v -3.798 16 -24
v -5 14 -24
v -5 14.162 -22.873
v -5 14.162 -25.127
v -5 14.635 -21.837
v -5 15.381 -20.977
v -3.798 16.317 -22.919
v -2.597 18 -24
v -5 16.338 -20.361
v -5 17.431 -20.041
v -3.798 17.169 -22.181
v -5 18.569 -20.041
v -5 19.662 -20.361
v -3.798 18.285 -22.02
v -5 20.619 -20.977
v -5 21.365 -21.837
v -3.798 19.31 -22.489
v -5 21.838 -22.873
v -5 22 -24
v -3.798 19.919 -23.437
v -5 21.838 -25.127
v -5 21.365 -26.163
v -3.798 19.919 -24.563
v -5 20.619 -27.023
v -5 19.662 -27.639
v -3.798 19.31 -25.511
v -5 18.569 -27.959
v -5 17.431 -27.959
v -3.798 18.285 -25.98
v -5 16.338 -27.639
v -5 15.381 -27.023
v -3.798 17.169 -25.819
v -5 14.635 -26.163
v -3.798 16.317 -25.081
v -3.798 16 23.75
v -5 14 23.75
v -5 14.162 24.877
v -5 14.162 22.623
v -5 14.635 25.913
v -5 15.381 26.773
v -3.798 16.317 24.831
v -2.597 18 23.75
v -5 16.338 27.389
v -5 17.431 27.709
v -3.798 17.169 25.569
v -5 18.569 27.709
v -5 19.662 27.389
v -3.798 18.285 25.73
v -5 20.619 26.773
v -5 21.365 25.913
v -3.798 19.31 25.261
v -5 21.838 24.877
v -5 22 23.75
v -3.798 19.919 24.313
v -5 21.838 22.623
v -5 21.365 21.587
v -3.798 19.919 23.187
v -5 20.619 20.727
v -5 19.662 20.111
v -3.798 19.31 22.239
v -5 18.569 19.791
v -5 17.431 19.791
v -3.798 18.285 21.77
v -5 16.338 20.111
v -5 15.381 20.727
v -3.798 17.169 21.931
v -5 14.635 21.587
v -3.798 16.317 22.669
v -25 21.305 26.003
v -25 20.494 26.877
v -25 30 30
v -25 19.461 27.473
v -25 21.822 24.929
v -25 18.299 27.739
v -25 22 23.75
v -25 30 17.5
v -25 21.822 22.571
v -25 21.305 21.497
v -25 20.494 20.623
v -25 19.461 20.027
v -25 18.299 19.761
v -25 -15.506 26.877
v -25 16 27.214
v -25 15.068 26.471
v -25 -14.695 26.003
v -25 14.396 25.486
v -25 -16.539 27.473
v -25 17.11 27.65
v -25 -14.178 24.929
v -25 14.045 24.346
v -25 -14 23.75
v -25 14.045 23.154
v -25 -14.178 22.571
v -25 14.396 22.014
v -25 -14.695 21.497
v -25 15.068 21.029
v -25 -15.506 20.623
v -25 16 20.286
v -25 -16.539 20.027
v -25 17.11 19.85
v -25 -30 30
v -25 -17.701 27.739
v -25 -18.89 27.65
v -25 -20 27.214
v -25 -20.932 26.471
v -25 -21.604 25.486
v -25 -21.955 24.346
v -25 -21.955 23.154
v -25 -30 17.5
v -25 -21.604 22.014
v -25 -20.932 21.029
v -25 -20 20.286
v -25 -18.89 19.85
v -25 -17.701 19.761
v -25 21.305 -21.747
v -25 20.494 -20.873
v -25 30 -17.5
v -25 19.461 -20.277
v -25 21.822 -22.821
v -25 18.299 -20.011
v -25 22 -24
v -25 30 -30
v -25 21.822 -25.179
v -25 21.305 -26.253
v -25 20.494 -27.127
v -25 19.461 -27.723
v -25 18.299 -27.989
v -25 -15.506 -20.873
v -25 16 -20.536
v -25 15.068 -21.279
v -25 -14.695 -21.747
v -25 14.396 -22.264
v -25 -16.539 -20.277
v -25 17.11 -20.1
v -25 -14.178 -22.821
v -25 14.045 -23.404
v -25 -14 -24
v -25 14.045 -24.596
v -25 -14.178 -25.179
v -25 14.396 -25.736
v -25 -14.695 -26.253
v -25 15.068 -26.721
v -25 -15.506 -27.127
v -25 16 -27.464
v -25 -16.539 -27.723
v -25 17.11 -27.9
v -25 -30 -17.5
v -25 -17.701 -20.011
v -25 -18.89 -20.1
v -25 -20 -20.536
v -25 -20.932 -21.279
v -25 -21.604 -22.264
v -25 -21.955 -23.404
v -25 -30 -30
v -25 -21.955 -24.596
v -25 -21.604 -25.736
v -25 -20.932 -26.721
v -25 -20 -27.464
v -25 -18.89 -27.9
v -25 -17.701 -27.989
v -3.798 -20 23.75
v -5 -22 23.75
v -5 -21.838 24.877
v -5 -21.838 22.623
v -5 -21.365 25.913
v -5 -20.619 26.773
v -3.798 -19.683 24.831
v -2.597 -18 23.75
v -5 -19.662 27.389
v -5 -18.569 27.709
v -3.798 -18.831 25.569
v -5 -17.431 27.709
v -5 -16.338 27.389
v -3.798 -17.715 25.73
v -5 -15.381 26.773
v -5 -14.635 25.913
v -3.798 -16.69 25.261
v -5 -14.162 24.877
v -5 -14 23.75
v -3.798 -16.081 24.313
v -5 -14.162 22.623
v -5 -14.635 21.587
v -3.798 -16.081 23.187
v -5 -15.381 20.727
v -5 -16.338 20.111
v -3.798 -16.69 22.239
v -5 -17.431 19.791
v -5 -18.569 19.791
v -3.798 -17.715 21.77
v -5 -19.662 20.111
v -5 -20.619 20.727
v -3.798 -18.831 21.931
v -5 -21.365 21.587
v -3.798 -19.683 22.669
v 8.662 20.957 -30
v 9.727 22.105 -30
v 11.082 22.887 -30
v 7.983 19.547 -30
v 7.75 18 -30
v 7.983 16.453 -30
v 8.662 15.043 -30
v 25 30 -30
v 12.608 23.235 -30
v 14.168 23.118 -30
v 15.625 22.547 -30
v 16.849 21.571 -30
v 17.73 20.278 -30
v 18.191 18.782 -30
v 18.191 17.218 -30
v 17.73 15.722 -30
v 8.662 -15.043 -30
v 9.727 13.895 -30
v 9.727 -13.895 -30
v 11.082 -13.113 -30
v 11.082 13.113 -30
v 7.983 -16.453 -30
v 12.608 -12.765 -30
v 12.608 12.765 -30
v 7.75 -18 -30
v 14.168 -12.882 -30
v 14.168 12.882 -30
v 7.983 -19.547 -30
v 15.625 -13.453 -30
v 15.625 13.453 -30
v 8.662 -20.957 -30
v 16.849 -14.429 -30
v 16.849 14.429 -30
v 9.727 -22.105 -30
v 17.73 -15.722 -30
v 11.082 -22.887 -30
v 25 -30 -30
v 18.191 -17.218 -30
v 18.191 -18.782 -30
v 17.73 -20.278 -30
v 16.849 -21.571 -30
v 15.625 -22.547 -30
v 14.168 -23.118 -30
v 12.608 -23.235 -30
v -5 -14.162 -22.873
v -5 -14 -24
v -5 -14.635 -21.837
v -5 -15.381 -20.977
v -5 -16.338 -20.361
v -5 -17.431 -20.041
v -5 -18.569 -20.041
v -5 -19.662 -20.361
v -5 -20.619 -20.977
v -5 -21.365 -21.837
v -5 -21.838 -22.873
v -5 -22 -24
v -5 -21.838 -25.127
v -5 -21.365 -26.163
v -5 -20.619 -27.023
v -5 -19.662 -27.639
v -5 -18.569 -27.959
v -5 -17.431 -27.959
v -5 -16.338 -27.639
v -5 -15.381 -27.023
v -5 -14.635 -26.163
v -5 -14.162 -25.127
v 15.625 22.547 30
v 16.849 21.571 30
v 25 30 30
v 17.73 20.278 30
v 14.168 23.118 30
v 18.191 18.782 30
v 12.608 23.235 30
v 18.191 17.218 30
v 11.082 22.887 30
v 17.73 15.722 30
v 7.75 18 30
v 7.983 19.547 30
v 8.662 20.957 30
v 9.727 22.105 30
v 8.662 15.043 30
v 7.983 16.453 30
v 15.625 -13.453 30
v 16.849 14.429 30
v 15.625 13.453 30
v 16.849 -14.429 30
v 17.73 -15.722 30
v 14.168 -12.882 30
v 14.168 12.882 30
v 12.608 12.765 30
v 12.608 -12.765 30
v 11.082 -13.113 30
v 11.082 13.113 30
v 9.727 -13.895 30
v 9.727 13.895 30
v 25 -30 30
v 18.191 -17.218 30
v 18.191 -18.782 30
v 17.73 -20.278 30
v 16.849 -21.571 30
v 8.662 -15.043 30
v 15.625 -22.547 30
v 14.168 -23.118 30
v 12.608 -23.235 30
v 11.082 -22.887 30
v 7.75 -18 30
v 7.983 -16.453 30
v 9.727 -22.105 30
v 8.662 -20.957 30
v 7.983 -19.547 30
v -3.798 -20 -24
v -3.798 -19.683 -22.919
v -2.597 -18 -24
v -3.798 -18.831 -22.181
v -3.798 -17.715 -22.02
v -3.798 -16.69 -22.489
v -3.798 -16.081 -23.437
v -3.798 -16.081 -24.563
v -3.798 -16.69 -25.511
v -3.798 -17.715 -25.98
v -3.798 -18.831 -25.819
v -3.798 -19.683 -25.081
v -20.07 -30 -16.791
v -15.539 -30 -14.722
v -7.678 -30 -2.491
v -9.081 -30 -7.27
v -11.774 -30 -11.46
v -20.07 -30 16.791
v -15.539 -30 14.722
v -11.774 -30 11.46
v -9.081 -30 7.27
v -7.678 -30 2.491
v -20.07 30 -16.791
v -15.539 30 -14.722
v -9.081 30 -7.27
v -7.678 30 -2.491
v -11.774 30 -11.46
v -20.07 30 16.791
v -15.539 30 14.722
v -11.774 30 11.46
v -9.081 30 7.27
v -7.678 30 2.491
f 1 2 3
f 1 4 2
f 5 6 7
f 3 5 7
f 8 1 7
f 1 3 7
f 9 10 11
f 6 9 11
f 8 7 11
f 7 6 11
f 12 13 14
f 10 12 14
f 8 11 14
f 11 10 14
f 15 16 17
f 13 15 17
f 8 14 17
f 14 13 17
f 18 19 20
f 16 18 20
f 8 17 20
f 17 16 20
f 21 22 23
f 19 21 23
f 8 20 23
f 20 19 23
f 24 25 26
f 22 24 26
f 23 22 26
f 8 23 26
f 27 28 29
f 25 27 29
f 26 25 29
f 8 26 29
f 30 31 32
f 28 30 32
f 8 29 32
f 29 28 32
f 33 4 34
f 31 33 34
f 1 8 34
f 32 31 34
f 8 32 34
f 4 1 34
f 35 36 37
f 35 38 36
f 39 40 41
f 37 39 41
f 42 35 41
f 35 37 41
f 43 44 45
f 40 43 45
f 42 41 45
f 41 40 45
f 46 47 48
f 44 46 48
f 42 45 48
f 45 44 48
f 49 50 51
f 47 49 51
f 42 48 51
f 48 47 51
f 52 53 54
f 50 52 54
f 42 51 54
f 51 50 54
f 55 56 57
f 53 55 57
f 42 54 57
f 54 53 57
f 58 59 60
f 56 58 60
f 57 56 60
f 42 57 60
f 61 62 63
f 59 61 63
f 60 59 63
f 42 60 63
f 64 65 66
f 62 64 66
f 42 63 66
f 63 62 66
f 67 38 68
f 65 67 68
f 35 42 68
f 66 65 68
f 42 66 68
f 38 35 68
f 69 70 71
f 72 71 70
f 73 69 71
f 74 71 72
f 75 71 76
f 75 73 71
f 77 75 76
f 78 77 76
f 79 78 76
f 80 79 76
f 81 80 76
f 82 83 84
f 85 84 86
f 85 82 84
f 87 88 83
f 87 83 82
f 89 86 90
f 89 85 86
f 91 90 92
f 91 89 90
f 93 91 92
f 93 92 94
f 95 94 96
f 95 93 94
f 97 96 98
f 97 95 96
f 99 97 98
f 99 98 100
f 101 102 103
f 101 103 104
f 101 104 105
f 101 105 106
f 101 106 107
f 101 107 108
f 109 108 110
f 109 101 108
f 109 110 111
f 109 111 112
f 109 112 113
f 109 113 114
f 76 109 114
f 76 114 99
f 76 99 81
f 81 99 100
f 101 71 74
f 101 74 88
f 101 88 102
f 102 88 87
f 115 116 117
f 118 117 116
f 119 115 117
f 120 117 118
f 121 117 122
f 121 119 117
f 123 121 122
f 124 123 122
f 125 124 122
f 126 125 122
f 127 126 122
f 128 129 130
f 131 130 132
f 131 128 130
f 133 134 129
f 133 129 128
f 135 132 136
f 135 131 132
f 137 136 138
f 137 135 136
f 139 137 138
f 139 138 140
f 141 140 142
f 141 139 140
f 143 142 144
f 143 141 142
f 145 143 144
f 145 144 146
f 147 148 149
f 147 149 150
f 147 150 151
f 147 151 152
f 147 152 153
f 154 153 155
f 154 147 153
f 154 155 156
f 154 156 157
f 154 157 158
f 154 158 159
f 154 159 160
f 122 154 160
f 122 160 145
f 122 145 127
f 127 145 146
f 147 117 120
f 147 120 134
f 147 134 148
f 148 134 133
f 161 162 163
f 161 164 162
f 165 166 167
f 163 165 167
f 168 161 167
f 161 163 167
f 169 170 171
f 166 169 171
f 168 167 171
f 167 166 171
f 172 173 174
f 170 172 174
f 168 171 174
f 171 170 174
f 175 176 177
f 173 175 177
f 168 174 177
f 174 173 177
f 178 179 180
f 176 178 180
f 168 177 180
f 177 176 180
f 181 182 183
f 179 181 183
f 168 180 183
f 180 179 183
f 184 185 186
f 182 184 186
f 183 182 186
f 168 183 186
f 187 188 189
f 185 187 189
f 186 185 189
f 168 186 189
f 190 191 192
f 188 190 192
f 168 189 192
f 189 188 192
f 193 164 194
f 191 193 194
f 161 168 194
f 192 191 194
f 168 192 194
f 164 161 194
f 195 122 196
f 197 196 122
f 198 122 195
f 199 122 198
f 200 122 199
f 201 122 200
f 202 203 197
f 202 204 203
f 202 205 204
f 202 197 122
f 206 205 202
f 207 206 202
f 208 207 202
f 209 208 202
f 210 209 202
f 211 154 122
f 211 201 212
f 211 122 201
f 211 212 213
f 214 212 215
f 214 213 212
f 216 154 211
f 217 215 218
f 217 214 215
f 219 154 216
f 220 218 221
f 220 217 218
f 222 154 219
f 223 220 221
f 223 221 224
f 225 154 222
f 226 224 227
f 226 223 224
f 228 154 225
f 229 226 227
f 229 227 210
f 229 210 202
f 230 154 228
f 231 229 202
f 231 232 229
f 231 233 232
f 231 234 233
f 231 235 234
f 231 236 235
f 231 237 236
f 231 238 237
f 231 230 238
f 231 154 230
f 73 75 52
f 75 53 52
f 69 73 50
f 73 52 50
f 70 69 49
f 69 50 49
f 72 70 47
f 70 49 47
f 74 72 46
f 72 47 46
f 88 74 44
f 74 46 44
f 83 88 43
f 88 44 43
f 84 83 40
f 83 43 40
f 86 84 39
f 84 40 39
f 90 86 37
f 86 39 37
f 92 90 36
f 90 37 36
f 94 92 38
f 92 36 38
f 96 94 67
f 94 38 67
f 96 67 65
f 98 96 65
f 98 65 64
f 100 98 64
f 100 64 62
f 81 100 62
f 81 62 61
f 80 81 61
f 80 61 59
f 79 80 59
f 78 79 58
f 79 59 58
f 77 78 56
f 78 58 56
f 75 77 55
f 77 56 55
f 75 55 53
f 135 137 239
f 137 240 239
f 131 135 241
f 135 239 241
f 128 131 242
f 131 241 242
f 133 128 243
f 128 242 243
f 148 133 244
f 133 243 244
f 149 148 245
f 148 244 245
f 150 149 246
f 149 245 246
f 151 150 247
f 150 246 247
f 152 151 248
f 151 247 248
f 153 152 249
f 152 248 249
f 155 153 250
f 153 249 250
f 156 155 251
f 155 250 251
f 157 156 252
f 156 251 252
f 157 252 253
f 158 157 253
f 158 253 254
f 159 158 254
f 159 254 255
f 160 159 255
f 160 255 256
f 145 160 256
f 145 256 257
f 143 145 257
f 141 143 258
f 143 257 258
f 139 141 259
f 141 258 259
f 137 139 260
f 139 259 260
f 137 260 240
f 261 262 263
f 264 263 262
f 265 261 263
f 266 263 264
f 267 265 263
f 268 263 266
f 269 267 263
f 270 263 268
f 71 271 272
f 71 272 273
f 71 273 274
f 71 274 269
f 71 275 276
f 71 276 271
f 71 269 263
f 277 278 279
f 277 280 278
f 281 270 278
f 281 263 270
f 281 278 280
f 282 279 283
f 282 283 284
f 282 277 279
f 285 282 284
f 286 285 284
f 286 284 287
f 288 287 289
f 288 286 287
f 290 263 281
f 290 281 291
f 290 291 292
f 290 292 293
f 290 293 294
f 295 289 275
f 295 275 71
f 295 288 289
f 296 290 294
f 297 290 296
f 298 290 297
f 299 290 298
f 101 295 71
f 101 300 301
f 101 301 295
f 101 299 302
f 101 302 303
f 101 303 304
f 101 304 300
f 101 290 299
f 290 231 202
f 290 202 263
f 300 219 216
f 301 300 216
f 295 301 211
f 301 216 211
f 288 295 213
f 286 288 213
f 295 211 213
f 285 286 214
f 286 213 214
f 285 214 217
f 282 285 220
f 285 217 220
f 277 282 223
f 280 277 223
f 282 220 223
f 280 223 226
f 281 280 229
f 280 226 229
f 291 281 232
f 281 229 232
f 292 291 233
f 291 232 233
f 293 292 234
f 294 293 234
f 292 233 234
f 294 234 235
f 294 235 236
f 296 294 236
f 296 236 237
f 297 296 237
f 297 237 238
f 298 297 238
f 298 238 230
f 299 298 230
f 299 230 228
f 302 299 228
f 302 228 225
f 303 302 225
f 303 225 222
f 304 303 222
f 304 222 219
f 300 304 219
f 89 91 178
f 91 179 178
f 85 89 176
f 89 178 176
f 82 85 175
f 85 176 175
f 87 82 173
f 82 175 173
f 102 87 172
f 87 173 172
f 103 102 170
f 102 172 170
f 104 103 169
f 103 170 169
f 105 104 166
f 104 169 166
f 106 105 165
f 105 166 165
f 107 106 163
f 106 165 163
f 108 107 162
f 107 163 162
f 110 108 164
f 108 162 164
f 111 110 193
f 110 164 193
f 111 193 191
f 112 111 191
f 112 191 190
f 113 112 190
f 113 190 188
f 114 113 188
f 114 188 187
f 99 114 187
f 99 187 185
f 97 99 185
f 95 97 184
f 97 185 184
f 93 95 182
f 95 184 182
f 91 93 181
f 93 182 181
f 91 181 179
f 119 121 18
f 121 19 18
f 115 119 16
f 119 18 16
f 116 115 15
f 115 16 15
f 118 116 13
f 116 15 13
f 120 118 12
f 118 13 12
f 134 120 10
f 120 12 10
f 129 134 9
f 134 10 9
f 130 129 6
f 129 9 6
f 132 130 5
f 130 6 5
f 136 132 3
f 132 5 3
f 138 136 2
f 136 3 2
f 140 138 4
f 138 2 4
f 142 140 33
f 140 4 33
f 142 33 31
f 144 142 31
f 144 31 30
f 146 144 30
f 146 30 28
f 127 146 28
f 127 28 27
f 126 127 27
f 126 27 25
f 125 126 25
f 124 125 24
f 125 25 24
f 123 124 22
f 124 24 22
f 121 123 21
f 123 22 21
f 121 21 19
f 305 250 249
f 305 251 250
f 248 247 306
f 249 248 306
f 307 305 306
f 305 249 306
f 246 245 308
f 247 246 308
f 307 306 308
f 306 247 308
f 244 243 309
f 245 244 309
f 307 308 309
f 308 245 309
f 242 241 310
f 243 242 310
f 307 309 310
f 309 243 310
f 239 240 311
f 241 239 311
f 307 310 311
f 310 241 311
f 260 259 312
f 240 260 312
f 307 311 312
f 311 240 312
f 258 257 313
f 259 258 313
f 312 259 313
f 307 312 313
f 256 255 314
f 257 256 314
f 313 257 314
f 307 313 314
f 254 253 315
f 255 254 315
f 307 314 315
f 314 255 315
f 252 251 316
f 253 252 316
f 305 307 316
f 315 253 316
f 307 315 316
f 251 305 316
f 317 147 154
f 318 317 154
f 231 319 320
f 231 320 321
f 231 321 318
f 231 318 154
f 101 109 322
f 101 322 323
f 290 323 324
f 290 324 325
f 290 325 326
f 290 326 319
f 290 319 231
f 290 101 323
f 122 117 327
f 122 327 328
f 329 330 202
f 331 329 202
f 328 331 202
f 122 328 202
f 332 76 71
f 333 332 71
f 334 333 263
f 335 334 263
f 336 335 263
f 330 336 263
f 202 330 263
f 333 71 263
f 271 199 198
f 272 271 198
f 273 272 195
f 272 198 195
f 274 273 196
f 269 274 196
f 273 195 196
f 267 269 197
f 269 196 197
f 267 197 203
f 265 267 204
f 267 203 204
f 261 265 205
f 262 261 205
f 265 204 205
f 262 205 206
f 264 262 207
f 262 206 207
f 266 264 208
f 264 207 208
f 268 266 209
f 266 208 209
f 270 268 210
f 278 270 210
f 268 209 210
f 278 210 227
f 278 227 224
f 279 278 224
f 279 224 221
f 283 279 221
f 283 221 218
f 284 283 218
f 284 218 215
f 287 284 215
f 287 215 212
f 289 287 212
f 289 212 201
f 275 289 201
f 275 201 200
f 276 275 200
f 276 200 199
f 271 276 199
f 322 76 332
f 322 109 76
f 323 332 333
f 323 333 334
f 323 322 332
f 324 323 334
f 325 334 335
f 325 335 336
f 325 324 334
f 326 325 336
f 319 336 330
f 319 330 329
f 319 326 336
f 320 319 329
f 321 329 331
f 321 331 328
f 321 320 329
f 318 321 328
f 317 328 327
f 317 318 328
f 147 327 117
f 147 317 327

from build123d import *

# Parameters (mm, degrees)
F1_DEPTH = 30
F3_D     = 10.5
F4_D     = 10.5
F6_D     = 8
F6_DEPTH = 20
F6_TIP   = 2.4034424761


with BuildPart() as f1:
    # F0 (on Front) → F1 (new body, symmetric)
    with BuildSketch(Plane.XZ):
        with BuildLine():
            Line((-25, -17.5), (-25, -30))
            Line((-25, -30), (25, -30))
            Line((25, -30), (25, 30))
            Line((25, 30), (-25, 30))
            Line((-25, 30), (-25, 17.5))
            ThreePointArc((-25, 17.5), (-7.5, 0), (-25, -17.5))
        make_face()
    extrude(amount=F1_DEPTH, both=True)

    # F3 (through all)
    with Locations(Plane.XY.offset(30)):
        with Locations((13, 18)):
            Hole(F3_D / 2)

    # F4 (through all)
    with Locations(Plane.XY.offset(30)):
        with Locations((13, -18)):
            Hole(F4_D / 2)

    # F6
    with Locations(Plane(origin=(-25, 0, 0), x_dir=(0, -1, 0), z_dir=(-1, 0, 0))):
        with Locations((18, 23.75), (-18, 23.75), (-18, -24), (18, -24)):
            Hole(F6_D / 2, depth=F6_DEPTH)
            with Locations((0, 0, -(F6_DEPTH + F6_TIP / 2))):  # 118° drill point
                Cone(0, F6_D / 2, F6_TIP, mode=Mode.SUBTRACT)


solid = f1.part
